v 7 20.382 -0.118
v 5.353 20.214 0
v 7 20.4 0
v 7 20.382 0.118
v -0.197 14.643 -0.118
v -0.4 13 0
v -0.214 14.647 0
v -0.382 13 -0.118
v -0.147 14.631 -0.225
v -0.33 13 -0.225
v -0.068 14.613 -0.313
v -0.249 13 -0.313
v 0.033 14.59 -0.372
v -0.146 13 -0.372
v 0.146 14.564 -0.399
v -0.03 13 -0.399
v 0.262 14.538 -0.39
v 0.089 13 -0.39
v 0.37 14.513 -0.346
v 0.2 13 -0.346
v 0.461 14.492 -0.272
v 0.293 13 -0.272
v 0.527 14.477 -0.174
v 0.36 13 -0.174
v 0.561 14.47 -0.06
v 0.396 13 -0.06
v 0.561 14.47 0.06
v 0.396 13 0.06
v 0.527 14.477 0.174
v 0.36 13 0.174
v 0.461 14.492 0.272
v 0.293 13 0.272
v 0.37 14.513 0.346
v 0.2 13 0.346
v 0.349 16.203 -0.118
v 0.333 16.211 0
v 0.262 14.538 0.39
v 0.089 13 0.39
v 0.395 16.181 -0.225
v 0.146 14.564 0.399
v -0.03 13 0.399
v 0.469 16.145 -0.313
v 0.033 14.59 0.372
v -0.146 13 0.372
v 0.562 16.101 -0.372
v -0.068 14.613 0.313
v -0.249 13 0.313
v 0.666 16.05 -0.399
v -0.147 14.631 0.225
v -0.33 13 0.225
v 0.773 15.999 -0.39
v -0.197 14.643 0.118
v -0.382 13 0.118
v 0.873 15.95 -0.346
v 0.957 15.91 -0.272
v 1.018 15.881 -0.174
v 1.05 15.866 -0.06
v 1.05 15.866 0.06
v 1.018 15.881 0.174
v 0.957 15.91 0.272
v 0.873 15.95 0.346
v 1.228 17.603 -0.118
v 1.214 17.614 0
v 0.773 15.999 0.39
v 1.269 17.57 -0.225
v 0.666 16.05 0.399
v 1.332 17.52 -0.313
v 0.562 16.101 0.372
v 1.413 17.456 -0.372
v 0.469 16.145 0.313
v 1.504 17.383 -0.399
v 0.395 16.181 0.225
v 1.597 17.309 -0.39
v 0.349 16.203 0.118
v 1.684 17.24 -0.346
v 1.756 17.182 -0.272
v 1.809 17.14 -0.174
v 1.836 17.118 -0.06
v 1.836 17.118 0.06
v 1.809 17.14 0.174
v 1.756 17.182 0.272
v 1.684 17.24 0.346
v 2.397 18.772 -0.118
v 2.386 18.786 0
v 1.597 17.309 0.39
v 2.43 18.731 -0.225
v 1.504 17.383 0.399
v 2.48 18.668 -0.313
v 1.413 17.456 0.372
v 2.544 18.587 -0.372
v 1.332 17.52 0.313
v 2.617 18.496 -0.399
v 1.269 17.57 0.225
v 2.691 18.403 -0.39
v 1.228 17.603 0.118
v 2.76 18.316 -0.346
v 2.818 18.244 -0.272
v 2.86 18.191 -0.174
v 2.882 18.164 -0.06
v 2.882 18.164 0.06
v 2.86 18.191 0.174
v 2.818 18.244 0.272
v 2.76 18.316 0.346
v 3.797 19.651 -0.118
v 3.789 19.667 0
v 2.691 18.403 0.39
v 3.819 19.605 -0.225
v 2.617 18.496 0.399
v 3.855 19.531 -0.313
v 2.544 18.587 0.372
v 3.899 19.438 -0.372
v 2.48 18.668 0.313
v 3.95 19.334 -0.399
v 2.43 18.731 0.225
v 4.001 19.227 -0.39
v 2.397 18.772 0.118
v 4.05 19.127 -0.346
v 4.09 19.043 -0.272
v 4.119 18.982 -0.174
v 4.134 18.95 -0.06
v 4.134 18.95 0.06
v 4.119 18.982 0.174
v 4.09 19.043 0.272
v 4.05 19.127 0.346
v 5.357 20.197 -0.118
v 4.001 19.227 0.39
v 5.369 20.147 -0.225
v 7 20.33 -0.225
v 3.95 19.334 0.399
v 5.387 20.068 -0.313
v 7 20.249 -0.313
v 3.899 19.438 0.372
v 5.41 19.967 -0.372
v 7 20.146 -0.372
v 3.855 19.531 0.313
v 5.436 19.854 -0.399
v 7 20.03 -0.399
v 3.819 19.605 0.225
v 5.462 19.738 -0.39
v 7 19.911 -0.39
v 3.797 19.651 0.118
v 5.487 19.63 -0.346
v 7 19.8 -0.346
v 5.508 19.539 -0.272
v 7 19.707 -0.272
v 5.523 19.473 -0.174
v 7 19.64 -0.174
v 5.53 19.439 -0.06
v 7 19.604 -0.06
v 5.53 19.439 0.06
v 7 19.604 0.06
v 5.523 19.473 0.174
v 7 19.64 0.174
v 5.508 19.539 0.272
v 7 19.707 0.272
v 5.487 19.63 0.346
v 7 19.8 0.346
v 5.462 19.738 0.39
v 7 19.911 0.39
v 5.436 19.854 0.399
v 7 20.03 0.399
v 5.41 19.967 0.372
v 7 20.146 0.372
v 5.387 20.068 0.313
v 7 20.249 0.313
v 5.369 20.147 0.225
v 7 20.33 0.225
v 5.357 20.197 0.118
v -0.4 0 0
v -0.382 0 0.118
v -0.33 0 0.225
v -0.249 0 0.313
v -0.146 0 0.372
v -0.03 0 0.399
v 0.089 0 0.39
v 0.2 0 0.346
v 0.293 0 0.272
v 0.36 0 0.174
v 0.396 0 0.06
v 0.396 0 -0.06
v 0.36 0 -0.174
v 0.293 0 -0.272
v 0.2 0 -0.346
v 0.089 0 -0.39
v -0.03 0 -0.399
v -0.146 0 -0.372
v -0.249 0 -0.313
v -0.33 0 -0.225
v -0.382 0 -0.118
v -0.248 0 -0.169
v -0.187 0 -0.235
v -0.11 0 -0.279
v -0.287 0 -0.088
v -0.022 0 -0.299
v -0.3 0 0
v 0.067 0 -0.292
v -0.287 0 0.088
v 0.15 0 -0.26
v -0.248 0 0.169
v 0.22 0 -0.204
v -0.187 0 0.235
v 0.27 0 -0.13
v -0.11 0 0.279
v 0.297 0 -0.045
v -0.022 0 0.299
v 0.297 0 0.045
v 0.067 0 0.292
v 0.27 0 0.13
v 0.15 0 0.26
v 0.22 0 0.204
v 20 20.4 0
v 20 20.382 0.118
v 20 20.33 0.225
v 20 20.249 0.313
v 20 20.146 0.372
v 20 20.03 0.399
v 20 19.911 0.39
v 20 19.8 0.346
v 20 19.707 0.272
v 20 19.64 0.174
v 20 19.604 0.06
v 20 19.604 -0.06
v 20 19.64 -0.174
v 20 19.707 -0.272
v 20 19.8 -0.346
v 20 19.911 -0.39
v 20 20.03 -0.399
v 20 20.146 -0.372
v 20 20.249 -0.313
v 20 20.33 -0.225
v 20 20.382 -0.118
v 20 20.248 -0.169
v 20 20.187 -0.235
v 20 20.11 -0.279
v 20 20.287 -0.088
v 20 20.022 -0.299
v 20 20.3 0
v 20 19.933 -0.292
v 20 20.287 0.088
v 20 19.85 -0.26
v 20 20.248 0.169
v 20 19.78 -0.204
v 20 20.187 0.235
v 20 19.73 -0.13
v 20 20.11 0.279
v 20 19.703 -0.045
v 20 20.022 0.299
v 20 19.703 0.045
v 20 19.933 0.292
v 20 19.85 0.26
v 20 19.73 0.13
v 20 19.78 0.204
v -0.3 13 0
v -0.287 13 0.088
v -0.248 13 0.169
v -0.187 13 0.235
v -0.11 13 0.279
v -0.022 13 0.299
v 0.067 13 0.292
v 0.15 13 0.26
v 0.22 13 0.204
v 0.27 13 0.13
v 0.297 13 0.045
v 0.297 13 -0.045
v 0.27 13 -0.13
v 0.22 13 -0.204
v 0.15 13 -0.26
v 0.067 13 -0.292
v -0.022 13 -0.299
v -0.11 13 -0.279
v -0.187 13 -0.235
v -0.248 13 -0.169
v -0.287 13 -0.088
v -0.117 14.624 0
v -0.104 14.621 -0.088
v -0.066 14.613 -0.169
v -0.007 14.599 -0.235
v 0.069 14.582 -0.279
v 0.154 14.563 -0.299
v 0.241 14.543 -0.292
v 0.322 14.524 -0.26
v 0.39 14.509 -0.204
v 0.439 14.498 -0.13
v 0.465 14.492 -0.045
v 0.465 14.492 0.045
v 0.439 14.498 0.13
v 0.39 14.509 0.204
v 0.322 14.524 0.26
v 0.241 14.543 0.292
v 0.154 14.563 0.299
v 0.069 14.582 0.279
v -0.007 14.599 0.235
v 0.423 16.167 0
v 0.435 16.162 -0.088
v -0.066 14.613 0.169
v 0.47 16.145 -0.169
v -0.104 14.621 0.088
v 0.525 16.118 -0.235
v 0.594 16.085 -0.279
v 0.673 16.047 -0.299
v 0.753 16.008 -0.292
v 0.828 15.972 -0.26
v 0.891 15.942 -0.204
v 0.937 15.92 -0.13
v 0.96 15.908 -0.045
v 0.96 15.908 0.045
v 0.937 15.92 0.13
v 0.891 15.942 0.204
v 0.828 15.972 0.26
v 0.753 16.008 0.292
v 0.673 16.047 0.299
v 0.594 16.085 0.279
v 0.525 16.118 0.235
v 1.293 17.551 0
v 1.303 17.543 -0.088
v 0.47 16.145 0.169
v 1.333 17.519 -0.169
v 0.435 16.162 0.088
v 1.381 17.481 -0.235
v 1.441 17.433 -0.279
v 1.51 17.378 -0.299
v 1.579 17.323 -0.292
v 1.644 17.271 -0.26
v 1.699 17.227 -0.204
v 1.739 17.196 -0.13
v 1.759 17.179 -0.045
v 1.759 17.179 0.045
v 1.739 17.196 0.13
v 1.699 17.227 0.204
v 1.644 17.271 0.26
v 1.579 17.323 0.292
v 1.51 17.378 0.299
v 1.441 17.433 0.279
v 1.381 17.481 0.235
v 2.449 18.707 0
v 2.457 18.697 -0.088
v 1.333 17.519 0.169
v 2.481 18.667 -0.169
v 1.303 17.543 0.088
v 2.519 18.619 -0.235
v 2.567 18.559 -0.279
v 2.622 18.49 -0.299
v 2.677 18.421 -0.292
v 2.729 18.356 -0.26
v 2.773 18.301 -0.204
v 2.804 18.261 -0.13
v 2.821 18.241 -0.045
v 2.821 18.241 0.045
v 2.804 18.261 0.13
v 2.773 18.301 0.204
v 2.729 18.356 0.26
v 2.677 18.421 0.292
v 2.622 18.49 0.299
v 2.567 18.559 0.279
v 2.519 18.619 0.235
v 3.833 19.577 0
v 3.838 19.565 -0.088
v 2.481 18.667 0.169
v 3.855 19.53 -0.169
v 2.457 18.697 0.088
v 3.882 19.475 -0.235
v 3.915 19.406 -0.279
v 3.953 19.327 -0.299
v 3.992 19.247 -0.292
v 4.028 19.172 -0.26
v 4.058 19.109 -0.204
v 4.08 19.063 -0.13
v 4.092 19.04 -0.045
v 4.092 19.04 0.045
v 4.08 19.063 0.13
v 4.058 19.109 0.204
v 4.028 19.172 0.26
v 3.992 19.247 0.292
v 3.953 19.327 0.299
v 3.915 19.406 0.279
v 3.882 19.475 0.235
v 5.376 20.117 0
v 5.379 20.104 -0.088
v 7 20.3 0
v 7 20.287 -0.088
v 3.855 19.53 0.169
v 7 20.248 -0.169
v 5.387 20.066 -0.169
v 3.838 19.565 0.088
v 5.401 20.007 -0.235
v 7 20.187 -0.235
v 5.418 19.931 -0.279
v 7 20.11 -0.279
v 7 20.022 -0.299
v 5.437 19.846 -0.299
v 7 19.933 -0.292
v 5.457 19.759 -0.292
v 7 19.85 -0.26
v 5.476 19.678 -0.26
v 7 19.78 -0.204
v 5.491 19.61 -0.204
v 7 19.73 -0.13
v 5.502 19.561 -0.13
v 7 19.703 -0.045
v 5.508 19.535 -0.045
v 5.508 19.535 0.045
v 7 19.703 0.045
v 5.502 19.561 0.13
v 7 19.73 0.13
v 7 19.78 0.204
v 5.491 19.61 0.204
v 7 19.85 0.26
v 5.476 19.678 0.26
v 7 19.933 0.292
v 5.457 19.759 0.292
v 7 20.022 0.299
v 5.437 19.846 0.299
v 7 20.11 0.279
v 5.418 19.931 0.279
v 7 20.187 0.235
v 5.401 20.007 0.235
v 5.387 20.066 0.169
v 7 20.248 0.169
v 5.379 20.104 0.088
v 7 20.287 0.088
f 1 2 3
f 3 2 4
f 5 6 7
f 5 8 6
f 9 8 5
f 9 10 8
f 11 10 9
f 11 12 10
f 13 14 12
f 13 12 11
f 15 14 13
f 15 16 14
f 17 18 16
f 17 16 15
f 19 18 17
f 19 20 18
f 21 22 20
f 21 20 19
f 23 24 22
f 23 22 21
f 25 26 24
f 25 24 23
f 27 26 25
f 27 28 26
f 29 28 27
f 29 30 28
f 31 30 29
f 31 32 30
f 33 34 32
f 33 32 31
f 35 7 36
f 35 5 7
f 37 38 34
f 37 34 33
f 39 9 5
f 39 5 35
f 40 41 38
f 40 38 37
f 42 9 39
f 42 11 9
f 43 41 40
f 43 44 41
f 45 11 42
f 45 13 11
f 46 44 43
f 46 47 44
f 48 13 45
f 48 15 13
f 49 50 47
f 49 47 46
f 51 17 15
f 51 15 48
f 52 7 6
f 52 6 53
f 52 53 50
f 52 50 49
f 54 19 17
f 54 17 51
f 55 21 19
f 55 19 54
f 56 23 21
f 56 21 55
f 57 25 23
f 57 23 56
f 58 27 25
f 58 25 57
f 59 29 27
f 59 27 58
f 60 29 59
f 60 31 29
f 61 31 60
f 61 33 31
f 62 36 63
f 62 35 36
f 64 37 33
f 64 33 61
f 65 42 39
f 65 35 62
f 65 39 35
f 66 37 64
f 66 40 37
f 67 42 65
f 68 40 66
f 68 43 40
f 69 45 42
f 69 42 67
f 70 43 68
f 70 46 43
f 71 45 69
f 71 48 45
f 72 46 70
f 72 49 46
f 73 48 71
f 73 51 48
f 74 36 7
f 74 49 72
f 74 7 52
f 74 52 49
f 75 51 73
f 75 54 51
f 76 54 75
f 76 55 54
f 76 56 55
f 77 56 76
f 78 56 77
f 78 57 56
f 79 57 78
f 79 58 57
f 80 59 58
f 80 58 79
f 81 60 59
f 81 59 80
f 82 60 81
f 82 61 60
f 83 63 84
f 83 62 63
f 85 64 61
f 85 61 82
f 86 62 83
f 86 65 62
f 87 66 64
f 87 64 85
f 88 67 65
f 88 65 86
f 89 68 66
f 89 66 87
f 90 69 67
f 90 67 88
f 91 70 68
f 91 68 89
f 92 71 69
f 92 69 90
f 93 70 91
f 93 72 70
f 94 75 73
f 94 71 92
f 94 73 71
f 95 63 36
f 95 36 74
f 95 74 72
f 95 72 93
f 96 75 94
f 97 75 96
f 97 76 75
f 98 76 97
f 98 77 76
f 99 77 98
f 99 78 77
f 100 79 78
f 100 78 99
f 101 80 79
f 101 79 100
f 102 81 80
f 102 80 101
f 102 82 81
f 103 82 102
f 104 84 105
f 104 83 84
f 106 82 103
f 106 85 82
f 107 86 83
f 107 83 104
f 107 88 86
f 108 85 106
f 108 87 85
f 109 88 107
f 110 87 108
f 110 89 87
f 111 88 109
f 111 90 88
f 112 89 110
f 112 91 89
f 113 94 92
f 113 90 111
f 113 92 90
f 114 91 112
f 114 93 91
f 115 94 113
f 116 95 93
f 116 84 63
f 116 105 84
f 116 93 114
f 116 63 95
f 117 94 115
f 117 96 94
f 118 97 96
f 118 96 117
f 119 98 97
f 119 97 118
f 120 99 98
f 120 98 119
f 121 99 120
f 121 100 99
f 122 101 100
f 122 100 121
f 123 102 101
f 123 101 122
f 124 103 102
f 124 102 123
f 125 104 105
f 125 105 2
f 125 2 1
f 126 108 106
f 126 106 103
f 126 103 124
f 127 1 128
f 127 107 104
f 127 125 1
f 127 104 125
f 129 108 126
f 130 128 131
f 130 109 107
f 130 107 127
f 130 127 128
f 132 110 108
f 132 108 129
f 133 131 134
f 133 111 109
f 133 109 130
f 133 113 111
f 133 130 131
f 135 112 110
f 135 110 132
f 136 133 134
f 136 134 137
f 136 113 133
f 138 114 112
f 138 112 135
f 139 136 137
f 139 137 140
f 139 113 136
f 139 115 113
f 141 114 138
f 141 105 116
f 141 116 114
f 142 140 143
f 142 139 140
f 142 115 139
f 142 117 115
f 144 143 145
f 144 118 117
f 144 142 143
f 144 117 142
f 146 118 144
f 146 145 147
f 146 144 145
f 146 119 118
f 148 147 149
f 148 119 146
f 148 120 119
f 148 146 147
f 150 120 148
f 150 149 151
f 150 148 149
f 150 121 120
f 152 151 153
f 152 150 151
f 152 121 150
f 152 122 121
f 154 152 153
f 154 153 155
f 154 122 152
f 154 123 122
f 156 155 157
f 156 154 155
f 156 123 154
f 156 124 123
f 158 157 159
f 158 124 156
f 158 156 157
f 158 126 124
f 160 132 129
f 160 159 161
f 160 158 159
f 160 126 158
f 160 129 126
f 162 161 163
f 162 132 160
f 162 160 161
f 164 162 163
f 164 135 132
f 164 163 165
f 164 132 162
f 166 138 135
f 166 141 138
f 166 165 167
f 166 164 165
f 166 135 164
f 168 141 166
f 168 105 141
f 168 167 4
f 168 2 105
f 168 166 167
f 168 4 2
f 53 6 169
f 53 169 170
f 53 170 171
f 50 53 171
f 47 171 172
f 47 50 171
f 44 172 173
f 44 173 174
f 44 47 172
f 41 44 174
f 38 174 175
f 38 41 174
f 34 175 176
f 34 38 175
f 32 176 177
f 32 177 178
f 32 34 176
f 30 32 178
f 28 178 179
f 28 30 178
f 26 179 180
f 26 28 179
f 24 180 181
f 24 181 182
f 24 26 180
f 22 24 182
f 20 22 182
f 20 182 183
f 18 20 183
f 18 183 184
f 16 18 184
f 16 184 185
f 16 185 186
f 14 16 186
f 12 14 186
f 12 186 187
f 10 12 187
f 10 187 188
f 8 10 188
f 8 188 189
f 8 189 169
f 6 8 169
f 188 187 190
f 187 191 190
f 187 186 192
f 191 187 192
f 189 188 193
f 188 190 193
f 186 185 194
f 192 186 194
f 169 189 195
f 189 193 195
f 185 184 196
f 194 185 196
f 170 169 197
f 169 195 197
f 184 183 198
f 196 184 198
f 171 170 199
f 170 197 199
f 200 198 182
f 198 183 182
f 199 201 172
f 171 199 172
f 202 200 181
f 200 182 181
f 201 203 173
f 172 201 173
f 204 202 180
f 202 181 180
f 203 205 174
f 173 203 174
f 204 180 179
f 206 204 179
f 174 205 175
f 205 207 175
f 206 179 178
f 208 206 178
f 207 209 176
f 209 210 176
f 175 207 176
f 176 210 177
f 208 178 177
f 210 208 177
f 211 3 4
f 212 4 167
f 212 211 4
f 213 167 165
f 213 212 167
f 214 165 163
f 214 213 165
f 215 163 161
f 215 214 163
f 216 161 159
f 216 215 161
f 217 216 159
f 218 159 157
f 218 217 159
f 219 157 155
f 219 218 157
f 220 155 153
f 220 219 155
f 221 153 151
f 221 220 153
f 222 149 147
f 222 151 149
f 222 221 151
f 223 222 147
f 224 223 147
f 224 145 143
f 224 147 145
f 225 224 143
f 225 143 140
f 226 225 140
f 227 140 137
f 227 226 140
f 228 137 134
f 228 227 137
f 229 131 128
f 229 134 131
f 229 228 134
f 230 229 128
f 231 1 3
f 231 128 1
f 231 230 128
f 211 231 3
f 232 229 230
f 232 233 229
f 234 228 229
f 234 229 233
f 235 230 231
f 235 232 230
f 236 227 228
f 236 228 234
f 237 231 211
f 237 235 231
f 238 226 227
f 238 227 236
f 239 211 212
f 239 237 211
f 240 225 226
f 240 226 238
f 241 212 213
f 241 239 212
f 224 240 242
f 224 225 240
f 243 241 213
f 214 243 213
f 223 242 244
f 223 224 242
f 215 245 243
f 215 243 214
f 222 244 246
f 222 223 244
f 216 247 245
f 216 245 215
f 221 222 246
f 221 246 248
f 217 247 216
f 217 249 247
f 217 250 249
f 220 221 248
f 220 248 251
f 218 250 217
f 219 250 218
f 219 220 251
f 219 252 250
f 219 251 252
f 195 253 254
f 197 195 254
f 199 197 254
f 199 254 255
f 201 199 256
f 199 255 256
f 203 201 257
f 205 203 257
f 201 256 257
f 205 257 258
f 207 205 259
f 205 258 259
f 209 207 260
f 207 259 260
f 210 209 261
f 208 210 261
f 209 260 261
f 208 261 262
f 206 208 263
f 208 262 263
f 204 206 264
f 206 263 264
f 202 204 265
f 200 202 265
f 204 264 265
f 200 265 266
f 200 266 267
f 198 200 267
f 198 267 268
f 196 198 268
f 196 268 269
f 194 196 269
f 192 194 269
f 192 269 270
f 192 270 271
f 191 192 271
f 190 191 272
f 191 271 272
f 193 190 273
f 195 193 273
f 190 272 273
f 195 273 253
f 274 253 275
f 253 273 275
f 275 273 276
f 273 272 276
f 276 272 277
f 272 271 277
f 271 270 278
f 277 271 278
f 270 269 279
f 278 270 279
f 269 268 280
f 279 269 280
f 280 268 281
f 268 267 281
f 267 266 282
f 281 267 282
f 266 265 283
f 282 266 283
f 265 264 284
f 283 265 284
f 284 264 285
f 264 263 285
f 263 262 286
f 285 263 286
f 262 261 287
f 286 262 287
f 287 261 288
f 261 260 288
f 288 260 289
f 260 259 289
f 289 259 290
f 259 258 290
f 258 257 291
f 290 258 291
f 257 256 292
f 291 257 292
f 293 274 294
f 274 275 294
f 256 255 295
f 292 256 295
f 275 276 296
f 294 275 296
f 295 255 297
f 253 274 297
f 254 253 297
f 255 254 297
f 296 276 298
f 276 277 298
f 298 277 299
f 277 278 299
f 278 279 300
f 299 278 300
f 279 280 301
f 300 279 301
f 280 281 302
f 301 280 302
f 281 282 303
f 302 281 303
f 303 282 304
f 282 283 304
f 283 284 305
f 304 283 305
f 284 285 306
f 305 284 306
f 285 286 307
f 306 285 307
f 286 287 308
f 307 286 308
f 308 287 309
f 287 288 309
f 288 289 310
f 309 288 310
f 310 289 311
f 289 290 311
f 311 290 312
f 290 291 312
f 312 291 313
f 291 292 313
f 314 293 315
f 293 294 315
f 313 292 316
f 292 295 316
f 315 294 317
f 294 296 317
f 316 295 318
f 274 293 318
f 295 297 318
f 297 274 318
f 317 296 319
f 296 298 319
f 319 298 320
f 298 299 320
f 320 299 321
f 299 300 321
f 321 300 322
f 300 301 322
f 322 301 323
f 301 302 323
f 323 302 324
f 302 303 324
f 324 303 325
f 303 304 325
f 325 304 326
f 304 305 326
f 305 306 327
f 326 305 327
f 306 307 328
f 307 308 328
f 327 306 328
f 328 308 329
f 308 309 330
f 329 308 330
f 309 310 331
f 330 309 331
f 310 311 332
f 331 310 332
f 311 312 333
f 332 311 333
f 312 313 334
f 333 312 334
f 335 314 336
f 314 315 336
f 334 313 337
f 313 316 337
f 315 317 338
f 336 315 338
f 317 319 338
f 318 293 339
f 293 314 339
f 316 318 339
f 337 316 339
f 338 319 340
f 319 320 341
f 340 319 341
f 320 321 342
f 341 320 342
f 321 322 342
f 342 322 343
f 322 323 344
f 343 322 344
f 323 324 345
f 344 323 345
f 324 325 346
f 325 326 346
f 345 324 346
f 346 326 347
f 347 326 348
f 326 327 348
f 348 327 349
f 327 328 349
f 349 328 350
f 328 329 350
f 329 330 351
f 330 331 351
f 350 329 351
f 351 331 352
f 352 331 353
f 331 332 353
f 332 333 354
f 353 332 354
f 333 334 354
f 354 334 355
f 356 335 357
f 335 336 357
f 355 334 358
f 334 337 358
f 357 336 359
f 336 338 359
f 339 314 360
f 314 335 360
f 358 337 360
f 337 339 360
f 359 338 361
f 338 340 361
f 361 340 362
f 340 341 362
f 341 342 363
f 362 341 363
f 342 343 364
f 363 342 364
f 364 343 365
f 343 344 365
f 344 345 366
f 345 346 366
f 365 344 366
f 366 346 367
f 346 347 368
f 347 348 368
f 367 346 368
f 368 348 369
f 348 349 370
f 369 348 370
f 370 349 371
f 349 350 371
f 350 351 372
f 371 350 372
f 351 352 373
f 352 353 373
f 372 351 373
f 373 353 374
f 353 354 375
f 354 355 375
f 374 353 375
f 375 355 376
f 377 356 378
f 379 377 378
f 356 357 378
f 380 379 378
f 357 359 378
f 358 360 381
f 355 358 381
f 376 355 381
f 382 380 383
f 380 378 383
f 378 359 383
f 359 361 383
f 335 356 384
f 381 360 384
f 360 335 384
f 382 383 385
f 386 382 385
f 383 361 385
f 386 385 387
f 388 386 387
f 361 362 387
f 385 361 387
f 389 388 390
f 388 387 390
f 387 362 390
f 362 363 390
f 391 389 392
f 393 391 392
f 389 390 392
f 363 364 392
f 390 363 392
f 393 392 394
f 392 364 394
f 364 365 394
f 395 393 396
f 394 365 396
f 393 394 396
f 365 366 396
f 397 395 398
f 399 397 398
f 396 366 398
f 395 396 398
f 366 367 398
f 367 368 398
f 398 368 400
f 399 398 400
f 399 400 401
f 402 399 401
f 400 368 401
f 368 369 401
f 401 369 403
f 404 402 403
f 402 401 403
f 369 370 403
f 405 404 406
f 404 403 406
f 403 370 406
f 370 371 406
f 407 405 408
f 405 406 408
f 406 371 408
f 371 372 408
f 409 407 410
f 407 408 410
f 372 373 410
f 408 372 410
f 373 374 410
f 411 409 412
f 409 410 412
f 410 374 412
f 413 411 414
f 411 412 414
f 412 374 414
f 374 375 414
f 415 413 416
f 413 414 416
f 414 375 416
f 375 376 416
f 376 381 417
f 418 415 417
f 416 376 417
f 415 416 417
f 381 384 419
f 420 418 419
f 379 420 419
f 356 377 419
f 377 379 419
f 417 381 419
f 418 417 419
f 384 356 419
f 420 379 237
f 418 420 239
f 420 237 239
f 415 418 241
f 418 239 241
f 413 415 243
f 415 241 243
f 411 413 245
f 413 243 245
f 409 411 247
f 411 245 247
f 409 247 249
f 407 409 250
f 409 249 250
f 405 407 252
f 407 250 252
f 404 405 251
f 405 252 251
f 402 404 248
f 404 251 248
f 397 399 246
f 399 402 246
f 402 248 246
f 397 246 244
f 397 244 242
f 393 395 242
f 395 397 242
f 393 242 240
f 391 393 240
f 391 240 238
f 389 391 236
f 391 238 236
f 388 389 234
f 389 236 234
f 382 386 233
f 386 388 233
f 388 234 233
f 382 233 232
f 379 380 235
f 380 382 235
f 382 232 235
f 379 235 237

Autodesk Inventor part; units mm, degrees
ref_plane "YZ Plane" through (0, 0, 0) normal (1, 0, 0) x (0, 1, 0)
ref_plane "XZ Plane" through (0, 0, 0) normal (0, 1, 0) x (-1, 0, 0)
ref_plane "XY Plane" through (0, 0, 0) normal (0, 0, 1) x (1, 0, 0)
sketch "Sketch1" plane through (0, 0, 0) normal (0, 0, 1) x (1, 0, 0)
  line L0 (7, 20) -> (20, 20)
  line L1 (0, 13) -> (0, 0)
  arc A0 (7, 20) -> (0, 13) centre (7, 13) ccw
  dimension "d3" = 7
  dimension "d10" = 20
  dimension "d11" = 20
sketch "Sketch2" plane through (0, 0, 0) normal (0, 1, 0) x (-1, 0, 0)
  circle A0 centre (0, 0) radius 0.4
  circle A1 centre (0, 0) radius 0.3
  dimension "d6" = 0.8
  dimension "d9" = 0.6
sweep "Sweep1" add profiles "Sketch2" path "Sketch1"
properties part number "TorsionOscillator-FillLine-Coupling" material "Nickel-Copper Alloy 400"
